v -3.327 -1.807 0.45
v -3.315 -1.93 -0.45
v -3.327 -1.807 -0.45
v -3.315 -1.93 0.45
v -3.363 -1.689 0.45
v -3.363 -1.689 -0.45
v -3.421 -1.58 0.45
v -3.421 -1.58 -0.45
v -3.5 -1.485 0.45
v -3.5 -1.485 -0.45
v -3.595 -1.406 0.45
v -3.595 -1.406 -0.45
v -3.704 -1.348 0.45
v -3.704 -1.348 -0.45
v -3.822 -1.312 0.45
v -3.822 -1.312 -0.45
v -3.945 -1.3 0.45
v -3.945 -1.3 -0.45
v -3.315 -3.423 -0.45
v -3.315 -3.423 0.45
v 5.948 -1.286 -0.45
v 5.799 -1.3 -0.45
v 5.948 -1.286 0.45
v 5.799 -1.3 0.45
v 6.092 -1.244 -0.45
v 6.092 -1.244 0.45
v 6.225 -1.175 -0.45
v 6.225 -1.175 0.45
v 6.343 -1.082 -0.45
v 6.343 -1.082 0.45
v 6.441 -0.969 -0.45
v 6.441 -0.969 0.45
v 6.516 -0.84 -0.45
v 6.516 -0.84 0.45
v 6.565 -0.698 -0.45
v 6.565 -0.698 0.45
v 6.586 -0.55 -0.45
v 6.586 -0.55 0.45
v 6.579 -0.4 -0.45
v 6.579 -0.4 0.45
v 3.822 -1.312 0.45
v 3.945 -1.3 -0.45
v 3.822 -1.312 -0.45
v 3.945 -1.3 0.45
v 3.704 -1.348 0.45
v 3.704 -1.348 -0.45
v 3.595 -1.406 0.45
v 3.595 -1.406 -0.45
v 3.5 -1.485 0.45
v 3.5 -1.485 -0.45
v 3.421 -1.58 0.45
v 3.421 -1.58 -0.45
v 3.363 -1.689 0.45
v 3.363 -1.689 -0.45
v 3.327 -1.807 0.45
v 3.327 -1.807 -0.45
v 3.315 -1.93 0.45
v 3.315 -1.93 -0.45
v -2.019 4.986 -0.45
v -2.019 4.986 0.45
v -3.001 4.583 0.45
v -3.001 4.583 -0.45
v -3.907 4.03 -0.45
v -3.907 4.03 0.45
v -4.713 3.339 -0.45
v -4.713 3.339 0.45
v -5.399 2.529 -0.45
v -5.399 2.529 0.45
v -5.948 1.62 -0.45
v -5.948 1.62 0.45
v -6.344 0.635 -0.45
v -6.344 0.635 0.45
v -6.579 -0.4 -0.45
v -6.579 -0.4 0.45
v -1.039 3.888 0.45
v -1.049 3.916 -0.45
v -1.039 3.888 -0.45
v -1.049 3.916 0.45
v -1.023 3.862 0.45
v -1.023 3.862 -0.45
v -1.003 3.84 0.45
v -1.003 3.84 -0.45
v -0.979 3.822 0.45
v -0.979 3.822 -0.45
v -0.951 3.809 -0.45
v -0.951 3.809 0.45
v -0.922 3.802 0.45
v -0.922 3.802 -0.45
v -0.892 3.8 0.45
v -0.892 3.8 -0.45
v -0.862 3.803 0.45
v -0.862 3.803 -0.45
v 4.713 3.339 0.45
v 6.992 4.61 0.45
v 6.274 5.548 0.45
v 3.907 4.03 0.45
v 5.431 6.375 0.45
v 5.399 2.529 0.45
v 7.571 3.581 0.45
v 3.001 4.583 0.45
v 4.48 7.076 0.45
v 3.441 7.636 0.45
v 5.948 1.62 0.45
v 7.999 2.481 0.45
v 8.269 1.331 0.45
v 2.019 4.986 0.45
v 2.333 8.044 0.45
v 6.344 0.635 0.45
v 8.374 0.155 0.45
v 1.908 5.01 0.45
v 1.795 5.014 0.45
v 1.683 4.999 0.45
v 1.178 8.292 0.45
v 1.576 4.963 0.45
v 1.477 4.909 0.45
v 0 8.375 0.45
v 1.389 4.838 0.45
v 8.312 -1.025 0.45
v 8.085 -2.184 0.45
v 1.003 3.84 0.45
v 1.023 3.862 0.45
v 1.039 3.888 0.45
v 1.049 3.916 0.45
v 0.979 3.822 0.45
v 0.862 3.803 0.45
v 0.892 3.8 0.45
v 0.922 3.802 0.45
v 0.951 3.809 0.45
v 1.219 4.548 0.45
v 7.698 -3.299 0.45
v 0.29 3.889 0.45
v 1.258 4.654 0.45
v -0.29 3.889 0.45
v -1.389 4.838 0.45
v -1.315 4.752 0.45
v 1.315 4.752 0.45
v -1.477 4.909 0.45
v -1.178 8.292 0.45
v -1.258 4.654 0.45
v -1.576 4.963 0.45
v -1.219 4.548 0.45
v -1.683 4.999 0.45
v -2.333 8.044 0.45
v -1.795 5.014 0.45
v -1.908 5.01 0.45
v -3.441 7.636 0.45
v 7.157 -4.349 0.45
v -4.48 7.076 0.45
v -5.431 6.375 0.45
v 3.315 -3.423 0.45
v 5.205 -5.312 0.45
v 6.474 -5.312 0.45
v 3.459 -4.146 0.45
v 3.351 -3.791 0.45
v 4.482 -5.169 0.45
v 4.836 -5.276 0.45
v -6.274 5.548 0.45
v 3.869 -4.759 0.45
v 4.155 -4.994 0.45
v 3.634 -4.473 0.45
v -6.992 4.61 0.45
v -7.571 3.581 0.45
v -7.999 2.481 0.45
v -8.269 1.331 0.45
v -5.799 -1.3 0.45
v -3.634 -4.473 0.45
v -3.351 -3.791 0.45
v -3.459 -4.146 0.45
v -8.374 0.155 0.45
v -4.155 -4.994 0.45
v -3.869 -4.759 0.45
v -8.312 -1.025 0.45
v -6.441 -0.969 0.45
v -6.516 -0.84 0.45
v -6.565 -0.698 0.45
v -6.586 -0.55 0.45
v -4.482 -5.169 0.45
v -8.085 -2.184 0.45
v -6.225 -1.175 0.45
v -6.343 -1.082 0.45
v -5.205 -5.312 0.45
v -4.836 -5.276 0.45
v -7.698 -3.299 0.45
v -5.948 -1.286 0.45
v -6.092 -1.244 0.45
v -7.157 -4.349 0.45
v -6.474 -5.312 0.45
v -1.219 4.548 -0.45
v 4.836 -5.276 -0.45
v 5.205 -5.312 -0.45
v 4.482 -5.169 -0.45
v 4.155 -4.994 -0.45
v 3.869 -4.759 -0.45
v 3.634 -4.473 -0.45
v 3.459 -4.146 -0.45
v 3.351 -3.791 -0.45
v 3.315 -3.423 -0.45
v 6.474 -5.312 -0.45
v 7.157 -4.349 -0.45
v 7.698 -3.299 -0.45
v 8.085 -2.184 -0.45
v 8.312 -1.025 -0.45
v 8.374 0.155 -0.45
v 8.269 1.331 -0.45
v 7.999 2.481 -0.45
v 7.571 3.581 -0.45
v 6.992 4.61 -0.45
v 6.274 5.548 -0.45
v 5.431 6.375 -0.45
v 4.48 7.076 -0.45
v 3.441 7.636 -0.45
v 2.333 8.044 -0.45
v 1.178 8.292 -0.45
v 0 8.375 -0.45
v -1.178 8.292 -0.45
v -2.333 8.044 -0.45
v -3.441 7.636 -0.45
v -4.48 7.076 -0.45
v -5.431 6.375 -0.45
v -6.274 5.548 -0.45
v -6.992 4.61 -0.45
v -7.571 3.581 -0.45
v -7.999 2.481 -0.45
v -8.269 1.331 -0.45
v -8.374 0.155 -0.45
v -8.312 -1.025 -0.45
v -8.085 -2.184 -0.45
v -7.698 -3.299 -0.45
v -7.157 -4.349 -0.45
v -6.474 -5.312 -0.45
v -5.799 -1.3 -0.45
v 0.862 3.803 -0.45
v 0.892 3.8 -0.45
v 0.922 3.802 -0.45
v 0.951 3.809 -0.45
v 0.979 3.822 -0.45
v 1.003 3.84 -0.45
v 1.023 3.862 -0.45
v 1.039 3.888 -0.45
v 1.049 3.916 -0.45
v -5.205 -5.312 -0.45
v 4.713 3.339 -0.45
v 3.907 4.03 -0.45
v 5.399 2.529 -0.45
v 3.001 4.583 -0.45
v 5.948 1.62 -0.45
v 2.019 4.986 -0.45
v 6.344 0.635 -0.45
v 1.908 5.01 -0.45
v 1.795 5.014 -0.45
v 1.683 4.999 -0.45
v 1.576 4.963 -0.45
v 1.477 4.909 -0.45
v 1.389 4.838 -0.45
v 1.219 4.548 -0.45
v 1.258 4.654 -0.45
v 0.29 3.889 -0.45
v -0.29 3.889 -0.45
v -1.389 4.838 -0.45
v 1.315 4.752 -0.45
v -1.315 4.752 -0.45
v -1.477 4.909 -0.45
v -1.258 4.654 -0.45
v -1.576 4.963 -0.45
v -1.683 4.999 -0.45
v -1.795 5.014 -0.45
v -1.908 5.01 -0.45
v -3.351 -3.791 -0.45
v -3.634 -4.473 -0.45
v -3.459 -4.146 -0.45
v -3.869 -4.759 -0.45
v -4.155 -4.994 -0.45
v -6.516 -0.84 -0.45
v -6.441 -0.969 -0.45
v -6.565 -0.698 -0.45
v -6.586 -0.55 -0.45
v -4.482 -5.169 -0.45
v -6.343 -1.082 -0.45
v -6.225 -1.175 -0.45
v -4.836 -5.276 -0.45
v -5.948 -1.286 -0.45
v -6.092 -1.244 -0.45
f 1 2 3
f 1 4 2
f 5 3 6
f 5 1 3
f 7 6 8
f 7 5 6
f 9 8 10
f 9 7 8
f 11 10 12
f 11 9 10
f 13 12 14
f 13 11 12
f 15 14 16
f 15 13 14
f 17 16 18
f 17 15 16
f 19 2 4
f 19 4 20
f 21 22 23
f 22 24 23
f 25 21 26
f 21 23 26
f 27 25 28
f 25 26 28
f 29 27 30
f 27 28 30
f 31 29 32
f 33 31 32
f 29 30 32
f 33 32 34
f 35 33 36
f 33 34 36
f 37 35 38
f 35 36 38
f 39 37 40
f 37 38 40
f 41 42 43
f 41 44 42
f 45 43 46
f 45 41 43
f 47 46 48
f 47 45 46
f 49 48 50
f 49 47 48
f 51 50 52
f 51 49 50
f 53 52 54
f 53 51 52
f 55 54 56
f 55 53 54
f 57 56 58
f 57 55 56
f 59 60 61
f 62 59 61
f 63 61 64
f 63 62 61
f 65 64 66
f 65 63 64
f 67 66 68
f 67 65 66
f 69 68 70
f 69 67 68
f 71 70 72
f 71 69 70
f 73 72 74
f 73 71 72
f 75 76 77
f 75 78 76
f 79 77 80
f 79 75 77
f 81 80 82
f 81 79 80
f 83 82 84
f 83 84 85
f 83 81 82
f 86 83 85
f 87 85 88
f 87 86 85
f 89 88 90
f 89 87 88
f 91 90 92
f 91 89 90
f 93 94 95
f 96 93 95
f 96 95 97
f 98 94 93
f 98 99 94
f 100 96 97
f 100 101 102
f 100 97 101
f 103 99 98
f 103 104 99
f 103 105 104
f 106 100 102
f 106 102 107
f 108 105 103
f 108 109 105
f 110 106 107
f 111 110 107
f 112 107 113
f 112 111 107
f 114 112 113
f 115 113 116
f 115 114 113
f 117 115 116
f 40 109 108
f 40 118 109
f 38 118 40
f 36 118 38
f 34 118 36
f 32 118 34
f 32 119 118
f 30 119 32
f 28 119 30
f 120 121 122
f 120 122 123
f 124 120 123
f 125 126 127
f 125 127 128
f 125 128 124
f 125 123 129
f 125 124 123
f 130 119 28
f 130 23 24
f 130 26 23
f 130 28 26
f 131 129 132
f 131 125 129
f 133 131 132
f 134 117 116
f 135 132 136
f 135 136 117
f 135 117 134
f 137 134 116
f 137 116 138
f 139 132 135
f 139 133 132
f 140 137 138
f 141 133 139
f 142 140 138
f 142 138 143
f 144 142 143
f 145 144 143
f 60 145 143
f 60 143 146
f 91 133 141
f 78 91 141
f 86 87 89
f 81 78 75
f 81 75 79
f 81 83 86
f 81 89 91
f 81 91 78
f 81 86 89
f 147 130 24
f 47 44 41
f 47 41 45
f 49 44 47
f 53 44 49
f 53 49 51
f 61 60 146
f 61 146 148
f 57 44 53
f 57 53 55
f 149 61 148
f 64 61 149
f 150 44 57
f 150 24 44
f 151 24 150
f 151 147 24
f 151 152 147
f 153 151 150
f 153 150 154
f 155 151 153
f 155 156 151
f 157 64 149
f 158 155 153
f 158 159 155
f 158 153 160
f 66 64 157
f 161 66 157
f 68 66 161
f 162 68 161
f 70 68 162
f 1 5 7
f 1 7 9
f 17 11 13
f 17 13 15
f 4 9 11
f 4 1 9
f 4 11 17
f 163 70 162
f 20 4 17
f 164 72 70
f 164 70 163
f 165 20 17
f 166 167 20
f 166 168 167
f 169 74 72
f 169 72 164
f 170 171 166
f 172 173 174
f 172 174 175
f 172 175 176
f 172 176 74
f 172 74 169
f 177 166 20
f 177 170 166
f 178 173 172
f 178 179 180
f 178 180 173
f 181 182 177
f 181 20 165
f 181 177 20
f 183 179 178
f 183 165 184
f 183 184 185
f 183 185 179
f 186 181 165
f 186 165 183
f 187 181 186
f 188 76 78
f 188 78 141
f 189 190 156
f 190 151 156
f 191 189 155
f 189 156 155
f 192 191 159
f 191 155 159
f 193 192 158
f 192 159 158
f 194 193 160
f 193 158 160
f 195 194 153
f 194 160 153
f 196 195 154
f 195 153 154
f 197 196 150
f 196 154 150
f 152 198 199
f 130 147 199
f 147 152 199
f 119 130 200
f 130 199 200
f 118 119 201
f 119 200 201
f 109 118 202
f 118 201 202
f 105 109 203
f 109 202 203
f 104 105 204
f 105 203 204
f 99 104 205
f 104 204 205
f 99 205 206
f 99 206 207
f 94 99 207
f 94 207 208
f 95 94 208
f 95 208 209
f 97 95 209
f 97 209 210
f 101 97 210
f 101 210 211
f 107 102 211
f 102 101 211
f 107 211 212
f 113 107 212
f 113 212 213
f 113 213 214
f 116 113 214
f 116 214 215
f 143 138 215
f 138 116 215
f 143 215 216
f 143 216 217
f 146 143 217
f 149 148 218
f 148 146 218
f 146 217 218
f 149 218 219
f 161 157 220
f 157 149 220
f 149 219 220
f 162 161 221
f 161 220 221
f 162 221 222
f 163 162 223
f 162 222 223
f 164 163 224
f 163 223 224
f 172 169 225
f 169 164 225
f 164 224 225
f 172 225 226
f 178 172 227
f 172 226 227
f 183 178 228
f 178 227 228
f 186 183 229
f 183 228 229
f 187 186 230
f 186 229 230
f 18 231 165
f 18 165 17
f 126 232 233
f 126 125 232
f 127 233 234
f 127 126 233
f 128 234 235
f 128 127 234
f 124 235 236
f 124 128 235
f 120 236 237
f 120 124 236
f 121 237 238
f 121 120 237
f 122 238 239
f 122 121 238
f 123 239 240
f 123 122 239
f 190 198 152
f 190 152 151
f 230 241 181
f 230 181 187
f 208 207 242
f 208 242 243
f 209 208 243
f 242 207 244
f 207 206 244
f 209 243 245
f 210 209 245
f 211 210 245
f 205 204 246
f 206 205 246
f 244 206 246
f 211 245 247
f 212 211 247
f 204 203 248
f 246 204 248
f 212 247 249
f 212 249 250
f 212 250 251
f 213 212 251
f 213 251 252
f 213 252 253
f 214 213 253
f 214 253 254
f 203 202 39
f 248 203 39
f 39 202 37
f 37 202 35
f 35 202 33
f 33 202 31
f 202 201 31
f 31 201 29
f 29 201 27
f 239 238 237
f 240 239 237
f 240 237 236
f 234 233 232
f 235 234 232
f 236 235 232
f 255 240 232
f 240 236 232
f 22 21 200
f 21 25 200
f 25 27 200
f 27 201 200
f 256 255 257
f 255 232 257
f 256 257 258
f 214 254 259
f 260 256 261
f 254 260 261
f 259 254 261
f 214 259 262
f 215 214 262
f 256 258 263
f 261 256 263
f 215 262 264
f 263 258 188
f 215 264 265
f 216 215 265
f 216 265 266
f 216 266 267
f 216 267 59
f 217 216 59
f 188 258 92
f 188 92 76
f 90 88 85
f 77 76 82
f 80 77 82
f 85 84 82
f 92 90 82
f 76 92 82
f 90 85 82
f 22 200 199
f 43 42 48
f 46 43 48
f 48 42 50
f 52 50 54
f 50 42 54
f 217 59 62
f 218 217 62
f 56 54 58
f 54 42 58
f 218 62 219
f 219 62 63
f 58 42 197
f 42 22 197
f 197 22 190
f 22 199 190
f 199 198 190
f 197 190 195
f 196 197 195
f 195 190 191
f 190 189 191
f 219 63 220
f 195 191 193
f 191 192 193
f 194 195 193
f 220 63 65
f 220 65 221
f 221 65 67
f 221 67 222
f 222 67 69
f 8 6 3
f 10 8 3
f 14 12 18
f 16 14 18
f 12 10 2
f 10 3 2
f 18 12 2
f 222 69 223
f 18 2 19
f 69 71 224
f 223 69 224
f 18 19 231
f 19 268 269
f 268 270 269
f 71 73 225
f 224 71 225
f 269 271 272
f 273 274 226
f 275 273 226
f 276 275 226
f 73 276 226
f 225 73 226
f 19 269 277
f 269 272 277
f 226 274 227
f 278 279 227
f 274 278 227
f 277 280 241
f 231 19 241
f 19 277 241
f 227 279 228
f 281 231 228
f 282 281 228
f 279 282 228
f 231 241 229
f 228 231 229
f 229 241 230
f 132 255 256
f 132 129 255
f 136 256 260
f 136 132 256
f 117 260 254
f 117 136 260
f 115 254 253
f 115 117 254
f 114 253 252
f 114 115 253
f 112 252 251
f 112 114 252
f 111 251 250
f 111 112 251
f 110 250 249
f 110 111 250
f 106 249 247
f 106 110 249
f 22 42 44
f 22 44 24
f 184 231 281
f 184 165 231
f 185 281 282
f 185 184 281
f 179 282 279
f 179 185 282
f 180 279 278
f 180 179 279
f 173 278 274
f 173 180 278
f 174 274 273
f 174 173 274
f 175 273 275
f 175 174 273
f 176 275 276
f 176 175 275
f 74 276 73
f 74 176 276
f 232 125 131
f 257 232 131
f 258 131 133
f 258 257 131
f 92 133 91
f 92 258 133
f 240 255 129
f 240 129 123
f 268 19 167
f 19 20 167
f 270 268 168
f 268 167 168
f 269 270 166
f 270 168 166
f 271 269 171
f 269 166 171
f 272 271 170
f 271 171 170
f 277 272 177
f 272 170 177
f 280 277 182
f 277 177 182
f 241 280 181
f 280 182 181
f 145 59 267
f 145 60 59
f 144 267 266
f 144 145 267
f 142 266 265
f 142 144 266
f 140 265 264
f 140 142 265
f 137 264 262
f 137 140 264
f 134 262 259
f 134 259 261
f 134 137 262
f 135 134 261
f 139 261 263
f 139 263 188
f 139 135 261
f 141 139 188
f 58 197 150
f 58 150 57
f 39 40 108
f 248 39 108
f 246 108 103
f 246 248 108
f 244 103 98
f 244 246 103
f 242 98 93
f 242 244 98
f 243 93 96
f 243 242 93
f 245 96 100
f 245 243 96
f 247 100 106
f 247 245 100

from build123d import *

# Parameters (mm, degrees)
SKETCH3_W               = 8.375
SKETCH3_H               = 0.9
CUT_EXTRUDE1_DEPTH      = 12.852584106
CUT_EXTRUDE1_DEPTH_BACK = 12.852584106
SKETCH4_OUTSIDE_W       = 23.492
SKETCH4_OUTSIDE_H       = 23.492
FILLET1_R               = 0.63
FILLET2_R               = 0.7875
FILLET3_R               = 1.89
FILLET4_R               = 0.1575


with BuildPart() as part:
    # Sketch3 → Revolve1 (revolve)
    with BuildSketch(Plane(origin=(0, 0, 0), x_dir=(1, 0, 0), z_dir=(0, 1, 0))):
        with Locations((-4.1875, 0)):
            Rectangle(SKETCH3_W, SKETCH3_H)
    revolve(axis=Axis((0, 0, -0.45), (0, 0, 1)))

    # Sketch4 outside → Cut-Extrude1 (cut, two sides: drawn at the far end of the back side and taken through both)
    with BuildSketch(Plane.XY.offset(-CUT_EXTRUDE1_DEPTH_BACK)):
        Rectangle(SKETCH4_OUTSIDE_W, SKETCH4_OUTSIDE_H)
        with BuildLine():
            Line((-3.315, -2.054452482), (-3.315, -5.3125))
            Line((-3.315, -5.3125), (-6.474408757, -5.3125))
            ThreePointArc((-6.474408757, -5.3125), (0, 8.375), (6.474408757, -5.3125))
            Line((6.474408757, -5.3125), (3.315, -5.3125))
            Line((3.315, -5.3125), (3.315, -2.054452482))
            Line((3.315, -2.054452482), (3.315, -1.3))
            Line((3.315, -1.3), (3.676955262, -1.3))
            Line((3.676955262, -1.3), (6.64647189, -1.3))
            ThreePointArc((6.64647189, -1.3), (5.150270007, 2.854307126), (1.381111973, 5.154380056))
            Line((1.381111973, 5.154380056), (1.009394276, 3.767110723))
            ThreePointArc((1.009394276, 3.767110723), (0, 3.9), (-1.009394276, 3.767110723))
            Line((-1.009394276, 3.767110723), (-1.381111973, 5.154380056))
            ThreePointArc((-1.381111973, 5.154380056), (-5.150270007, 2.854307126), (-6.64647189, -1.3))
            Line((-6.64647189, -1.3), (-3.676955262, -1.3))
            Line((-3.676955262, -1.3), (-3.315, -1.3))
            Line((-3.315, -1.3), (-3.315, -2.054452482))
        make_face(mode=Mode.SUBTRACT)
    extrude(amount=CUT_EXTRUDE1_DEPTH + CUT_EXTRUDE1_DEPTH_BACK, mode=Mode.SUBTRACT)

    # Fillet1
    fillet1_edges = [part.edges().sort_by_distance(p)[0] for p in [
        (3.315, -1.3, 0),
        (1.381111973, 5.154380056, 0),
        (-1.381111973, 5.154380056, 0),
        (-3.315, -1.3, 0),
    ]]
    fillet(fillet1_edges, radius=FILLET1_R)

    # Fillet2
    fillet2_edges = [part.edges().sort_by_distance(p)[0] for p in [
        (6.64647189, -1.3, 0),
        (-6.64647189, -1.3, 0),
    ]]
    fillet(fillet2_edges, radius=FILLET2_R)

    # Fillet3
    fillet3_edges = [part.edges().sort_by_distance(p)[0] for p in [
        (3.315, -5.3125, 0),
        (-3.315, -5.3125, 0),
    ]]
    fillet(fillet3_edges, radius=FILLET3_R)

    # Fillet4
    fillet4_edges = [part.edges().sort_by_distance(p)[0] for p in [
        (1.009394276, 3.767110723, 0),
        (-1.009394276, 3.767110723, 0),
    ]]
    fillet(fillet4_edges, radius=FILLET4_R)


solid = part.part
